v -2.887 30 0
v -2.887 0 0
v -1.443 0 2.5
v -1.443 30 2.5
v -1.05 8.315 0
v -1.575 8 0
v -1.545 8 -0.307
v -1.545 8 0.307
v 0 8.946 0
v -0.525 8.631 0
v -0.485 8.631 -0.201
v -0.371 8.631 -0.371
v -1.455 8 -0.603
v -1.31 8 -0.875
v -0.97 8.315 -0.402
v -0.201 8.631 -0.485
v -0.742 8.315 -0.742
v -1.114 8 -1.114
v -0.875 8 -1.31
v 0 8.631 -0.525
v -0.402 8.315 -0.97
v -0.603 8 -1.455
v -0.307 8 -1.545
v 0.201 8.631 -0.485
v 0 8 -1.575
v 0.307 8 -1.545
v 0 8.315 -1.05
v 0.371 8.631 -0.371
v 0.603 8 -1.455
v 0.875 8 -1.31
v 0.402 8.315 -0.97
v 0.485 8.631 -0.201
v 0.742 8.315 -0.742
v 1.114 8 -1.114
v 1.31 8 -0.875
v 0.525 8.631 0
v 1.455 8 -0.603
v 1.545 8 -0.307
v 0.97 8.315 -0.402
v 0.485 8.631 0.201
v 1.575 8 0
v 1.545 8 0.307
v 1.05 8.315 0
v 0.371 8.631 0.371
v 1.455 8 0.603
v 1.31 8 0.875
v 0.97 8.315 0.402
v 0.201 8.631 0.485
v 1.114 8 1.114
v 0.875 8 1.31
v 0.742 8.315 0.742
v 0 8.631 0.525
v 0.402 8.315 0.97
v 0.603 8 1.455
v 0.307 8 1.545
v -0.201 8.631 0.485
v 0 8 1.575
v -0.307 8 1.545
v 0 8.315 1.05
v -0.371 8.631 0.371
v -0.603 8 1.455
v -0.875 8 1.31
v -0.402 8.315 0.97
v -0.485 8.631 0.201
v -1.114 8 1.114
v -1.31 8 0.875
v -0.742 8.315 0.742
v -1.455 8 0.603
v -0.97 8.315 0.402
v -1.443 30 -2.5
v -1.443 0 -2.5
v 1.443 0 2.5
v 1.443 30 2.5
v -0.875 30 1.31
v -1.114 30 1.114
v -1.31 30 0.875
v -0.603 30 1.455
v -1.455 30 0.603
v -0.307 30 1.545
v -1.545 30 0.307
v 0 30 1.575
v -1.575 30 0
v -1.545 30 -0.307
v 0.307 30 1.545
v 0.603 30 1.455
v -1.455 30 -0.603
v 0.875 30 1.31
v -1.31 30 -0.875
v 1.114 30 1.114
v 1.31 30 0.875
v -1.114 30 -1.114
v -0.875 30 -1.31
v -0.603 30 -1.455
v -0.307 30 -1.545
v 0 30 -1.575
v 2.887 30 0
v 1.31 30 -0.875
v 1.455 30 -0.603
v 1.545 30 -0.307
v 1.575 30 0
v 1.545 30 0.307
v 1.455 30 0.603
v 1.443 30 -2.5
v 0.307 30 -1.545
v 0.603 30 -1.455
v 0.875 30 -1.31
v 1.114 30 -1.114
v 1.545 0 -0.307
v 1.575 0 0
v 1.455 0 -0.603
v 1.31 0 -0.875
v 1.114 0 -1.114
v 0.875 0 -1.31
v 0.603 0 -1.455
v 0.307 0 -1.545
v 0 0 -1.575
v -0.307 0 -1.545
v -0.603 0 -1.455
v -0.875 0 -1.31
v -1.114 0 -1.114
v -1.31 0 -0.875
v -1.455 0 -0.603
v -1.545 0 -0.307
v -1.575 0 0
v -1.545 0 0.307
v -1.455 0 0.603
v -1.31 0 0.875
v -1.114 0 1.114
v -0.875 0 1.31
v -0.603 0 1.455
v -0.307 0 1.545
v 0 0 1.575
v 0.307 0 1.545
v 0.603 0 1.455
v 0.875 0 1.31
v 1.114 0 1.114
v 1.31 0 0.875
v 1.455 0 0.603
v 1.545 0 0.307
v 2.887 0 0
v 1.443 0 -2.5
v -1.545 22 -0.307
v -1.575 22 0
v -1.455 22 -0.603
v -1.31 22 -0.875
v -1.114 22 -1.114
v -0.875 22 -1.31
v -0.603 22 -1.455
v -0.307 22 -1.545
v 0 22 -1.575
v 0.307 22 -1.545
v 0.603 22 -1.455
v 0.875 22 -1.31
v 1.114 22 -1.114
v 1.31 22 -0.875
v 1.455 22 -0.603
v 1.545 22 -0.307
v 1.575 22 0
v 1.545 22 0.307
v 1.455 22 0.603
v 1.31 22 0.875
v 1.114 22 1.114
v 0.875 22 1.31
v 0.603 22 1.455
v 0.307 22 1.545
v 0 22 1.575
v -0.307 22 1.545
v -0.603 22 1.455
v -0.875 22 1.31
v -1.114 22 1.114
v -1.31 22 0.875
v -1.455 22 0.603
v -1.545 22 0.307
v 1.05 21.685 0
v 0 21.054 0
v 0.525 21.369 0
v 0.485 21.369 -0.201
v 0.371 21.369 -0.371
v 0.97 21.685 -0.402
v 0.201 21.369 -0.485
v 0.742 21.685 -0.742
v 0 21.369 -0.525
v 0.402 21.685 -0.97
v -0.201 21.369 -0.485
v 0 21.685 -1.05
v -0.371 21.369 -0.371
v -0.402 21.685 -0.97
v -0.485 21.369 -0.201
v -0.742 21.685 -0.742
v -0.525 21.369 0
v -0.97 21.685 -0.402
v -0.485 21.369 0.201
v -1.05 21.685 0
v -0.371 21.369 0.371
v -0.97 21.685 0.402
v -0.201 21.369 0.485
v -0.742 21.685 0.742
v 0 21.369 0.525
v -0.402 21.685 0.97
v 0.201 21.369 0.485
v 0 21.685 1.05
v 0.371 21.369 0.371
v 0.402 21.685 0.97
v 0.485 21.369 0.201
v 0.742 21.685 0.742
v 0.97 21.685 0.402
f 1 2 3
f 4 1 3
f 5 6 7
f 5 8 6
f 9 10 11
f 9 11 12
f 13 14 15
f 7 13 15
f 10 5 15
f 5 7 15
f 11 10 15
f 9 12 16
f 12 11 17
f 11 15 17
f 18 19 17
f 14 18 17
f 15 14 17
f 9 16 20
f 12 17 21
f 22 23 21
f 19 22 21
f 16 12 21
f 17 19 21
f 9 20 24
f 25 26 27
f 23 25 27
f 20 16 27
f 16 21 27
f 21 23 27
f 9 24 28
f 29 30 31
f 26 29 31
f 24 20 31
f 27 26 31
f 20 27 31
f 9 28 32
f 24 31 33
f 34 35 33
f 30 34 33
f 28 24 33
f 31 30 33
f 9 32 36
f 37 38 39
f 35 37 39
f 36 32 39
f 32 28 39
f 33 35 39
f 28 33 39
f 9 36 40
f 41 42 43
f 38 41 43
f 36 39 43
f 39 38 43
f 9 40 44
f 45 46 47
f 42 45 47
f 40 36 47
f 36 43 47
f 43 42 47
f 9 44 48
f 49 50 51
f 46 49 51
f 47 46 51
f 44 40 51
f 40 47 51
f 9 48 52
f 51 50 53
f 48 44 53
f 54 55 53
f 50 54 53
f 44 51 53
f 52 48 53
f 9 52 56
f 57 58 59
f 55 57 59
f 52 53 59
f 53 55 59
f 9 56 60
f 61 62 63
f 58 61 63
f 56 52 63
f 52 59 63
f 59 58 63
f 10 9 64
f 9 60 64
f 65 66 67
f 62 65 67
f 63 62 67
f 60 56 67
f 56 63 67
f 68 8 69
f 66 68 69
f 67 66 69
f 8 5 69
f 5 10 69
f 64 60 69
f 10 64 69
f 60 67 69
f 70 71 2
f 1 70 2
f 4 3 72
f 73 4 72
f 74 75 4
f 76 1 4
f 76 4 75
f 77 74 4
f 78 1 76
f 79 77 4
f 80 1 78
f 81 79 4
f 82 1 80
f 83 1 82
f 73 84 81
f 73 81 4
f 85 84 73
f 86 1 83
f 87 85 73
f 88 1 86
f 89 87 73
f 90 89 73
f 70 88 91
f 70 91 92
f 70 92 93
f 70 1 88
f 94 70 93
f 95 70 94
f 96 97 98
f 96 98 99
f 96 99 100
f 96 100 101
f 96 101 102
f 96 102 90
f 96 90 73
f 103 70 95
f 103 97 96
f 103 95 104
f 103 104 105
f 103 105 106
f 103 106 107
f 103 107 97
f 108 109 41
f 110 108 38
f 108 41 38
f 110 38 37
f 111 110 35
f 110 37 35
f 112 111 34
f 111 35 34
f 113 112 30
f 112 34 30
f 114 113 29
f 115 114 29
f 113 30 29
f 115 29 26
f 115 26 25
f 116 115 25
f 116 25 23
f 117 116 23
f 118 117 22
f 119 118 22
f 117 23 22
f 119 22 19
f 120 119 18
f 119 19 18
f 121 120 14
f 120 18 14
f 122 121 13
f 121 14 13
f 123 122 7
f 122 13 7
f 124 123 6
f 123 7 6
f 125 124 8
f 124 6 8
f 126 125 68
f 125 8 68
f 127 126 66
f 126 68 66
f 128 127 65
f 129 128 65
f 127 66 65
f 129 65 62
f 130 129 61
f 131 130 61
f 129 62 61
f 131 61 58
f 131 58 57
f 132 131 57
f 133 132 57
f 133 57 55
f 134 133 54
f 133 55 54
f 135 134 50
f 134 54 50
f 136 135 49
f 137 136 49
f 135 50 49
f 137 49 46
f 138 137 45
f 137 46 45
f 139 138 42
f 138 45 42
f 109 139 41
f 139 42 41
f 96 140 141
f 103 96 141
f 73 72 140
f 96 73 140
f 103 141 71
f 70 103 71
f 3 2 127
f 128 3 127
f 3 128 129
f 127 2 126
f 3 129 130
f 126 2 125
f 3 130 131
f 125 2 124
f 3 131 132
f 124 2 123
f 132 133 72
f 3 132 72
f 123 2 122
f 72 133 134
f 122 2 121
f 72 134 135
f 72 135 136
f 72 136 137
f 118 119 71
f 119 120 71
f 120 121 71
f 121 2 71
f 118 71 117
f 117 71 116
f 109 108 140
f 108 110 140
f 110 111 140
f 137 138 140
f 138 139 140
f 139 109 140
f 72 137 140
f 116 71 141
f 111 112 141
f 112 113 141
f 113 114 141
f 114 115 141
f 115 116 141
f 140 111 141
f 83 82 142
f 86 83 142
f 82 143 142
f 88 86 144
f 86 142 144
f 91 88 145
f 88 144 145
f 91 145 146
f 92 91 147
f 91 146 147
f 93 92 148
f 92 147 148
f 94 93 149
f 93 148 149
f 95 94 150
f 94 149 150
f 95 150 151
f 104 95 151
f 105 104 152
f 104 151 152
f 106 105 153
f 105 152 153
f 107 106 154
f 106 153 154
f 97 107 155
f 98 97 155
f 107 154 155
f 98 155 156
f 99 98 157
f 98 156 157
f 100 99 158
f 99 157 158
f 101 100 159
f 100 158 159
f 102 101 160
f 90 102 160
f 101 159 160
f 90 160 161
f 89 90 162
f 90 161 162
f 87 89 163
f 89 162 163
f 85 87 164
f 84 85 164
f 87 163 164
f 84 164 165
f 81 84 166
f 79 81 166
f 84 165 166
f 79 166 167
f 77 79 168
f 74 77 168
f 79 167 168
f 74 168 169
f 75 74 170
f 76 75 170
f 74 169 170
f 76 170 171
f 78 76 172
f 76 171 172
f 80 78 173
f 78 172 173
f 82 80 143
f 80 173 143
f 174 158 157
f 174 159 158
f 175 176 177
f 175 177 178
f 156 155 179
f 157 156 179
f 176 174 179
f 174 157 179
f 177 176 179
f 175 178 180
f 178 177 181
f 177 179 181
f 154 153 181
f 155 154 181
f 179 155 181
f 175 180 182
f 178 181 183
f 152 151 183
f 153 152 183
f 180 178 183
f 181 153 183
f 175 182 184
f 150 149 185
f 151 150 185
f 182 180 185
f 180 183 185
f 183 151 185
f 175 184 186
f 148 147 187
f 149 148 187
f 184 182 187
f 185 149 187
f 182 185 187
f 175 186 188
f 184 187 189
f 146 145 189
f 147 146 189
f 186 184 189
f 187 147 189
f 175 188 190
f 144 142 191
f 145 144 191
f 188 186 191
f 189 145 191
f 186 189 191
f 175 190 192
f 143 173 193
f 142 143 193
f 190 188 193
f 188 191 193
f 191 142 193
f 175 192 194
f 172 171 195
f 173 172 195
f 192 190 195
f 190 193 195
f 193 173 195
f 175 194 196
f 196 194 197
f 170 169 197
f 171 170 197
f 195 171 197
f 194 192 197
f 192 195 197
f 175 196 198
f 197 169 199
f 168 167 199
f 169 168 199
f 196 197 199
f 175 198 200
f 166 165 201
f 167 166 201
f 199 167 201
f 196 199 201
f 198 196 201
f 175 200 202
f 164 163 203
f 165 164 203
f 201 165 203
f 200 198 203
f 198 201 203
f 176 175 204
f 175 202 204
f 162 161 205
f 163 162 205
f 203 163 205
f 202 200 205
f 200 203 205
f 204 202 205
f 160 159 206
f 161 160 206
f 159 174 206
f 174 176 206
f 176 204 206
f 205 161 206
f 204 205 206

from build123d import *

# Parameters (mm, degrees)
EXTRUDE_1_DEPTH       = 30
HOLE_WIZARD_M35_D     = 3.15
HOLE_WIZARD_M35_DEPTH = 8
HOLE_WIZARD_M35_TIP   = 0.946355475
HOLE_WIZARD_M36_D     = 3.15
HOLE_WIZARD_M36_DEPTH = 8
HOLE_WIZARD_M36_TIP   = 0.946355475


with BuildPart() as part:
    # Эскиз1 → Бобышка-Вытянуть1 (new body)
    with BuildSketch(Plane(origin=(0, 0, 0), x_dir=(1, 0, 0), z_dir=(0, 1, 0))):
        Polygon((2.886751346, 0), (1.443375673, 2.5), (-1.443375673, 2.5), (-2.886751346, 0), (-1.443375673, -2.5), (1.443375673, -2.5), align=None)
    extrude(amount=EXTRUDE_1_DEPTH)

    # Сверло под метчик  спиральное M35
    with Locations(Plane(origin=(0, 30, 0), x_dir=(1, 0, 0), z_dir=(0, 1, 0))):
        with Locations((0, 0)):
            Hole(HOLE_WIZARD_M35_D / 2, depth=HOLE_WIZARD_M35_DEPTH)
            with Locations((0, 0, -(HOLE_WIZARD_M35_DEPTH + HOLE_WIZARD_M35_TIP / 2))):  # 118° drill point
                Cone(0, HOLE_WIZARD_M35_D / 2, HOLE_WIZARD_M35_TIP, mode=Mode.SUBTRACT)

    # Сверло под метчик  спиральное M36
    with Locations(Plane(origin=(0, 0, 0), x_dir=(-1, 0, 0), z_dir=(0, -1, 0))):
        with Locations((0, 0)):
            Hole(HOLE_WIZARD_M36_D / 2, depth=HOLE_WIZARD_M36_DEPTH)
            with Locations((0, 0, -(HOLE_WIZARD_M36_DEPTH + HOLE_WIZARD_M36_TIP / 2))):  # 118° drill point
                Cone(0, HOLE_WIZARD_M36_D / 2, HOLE_WIZARD_M36_TIP, mode=Mode.SUBTRACT)


solid = part.part
